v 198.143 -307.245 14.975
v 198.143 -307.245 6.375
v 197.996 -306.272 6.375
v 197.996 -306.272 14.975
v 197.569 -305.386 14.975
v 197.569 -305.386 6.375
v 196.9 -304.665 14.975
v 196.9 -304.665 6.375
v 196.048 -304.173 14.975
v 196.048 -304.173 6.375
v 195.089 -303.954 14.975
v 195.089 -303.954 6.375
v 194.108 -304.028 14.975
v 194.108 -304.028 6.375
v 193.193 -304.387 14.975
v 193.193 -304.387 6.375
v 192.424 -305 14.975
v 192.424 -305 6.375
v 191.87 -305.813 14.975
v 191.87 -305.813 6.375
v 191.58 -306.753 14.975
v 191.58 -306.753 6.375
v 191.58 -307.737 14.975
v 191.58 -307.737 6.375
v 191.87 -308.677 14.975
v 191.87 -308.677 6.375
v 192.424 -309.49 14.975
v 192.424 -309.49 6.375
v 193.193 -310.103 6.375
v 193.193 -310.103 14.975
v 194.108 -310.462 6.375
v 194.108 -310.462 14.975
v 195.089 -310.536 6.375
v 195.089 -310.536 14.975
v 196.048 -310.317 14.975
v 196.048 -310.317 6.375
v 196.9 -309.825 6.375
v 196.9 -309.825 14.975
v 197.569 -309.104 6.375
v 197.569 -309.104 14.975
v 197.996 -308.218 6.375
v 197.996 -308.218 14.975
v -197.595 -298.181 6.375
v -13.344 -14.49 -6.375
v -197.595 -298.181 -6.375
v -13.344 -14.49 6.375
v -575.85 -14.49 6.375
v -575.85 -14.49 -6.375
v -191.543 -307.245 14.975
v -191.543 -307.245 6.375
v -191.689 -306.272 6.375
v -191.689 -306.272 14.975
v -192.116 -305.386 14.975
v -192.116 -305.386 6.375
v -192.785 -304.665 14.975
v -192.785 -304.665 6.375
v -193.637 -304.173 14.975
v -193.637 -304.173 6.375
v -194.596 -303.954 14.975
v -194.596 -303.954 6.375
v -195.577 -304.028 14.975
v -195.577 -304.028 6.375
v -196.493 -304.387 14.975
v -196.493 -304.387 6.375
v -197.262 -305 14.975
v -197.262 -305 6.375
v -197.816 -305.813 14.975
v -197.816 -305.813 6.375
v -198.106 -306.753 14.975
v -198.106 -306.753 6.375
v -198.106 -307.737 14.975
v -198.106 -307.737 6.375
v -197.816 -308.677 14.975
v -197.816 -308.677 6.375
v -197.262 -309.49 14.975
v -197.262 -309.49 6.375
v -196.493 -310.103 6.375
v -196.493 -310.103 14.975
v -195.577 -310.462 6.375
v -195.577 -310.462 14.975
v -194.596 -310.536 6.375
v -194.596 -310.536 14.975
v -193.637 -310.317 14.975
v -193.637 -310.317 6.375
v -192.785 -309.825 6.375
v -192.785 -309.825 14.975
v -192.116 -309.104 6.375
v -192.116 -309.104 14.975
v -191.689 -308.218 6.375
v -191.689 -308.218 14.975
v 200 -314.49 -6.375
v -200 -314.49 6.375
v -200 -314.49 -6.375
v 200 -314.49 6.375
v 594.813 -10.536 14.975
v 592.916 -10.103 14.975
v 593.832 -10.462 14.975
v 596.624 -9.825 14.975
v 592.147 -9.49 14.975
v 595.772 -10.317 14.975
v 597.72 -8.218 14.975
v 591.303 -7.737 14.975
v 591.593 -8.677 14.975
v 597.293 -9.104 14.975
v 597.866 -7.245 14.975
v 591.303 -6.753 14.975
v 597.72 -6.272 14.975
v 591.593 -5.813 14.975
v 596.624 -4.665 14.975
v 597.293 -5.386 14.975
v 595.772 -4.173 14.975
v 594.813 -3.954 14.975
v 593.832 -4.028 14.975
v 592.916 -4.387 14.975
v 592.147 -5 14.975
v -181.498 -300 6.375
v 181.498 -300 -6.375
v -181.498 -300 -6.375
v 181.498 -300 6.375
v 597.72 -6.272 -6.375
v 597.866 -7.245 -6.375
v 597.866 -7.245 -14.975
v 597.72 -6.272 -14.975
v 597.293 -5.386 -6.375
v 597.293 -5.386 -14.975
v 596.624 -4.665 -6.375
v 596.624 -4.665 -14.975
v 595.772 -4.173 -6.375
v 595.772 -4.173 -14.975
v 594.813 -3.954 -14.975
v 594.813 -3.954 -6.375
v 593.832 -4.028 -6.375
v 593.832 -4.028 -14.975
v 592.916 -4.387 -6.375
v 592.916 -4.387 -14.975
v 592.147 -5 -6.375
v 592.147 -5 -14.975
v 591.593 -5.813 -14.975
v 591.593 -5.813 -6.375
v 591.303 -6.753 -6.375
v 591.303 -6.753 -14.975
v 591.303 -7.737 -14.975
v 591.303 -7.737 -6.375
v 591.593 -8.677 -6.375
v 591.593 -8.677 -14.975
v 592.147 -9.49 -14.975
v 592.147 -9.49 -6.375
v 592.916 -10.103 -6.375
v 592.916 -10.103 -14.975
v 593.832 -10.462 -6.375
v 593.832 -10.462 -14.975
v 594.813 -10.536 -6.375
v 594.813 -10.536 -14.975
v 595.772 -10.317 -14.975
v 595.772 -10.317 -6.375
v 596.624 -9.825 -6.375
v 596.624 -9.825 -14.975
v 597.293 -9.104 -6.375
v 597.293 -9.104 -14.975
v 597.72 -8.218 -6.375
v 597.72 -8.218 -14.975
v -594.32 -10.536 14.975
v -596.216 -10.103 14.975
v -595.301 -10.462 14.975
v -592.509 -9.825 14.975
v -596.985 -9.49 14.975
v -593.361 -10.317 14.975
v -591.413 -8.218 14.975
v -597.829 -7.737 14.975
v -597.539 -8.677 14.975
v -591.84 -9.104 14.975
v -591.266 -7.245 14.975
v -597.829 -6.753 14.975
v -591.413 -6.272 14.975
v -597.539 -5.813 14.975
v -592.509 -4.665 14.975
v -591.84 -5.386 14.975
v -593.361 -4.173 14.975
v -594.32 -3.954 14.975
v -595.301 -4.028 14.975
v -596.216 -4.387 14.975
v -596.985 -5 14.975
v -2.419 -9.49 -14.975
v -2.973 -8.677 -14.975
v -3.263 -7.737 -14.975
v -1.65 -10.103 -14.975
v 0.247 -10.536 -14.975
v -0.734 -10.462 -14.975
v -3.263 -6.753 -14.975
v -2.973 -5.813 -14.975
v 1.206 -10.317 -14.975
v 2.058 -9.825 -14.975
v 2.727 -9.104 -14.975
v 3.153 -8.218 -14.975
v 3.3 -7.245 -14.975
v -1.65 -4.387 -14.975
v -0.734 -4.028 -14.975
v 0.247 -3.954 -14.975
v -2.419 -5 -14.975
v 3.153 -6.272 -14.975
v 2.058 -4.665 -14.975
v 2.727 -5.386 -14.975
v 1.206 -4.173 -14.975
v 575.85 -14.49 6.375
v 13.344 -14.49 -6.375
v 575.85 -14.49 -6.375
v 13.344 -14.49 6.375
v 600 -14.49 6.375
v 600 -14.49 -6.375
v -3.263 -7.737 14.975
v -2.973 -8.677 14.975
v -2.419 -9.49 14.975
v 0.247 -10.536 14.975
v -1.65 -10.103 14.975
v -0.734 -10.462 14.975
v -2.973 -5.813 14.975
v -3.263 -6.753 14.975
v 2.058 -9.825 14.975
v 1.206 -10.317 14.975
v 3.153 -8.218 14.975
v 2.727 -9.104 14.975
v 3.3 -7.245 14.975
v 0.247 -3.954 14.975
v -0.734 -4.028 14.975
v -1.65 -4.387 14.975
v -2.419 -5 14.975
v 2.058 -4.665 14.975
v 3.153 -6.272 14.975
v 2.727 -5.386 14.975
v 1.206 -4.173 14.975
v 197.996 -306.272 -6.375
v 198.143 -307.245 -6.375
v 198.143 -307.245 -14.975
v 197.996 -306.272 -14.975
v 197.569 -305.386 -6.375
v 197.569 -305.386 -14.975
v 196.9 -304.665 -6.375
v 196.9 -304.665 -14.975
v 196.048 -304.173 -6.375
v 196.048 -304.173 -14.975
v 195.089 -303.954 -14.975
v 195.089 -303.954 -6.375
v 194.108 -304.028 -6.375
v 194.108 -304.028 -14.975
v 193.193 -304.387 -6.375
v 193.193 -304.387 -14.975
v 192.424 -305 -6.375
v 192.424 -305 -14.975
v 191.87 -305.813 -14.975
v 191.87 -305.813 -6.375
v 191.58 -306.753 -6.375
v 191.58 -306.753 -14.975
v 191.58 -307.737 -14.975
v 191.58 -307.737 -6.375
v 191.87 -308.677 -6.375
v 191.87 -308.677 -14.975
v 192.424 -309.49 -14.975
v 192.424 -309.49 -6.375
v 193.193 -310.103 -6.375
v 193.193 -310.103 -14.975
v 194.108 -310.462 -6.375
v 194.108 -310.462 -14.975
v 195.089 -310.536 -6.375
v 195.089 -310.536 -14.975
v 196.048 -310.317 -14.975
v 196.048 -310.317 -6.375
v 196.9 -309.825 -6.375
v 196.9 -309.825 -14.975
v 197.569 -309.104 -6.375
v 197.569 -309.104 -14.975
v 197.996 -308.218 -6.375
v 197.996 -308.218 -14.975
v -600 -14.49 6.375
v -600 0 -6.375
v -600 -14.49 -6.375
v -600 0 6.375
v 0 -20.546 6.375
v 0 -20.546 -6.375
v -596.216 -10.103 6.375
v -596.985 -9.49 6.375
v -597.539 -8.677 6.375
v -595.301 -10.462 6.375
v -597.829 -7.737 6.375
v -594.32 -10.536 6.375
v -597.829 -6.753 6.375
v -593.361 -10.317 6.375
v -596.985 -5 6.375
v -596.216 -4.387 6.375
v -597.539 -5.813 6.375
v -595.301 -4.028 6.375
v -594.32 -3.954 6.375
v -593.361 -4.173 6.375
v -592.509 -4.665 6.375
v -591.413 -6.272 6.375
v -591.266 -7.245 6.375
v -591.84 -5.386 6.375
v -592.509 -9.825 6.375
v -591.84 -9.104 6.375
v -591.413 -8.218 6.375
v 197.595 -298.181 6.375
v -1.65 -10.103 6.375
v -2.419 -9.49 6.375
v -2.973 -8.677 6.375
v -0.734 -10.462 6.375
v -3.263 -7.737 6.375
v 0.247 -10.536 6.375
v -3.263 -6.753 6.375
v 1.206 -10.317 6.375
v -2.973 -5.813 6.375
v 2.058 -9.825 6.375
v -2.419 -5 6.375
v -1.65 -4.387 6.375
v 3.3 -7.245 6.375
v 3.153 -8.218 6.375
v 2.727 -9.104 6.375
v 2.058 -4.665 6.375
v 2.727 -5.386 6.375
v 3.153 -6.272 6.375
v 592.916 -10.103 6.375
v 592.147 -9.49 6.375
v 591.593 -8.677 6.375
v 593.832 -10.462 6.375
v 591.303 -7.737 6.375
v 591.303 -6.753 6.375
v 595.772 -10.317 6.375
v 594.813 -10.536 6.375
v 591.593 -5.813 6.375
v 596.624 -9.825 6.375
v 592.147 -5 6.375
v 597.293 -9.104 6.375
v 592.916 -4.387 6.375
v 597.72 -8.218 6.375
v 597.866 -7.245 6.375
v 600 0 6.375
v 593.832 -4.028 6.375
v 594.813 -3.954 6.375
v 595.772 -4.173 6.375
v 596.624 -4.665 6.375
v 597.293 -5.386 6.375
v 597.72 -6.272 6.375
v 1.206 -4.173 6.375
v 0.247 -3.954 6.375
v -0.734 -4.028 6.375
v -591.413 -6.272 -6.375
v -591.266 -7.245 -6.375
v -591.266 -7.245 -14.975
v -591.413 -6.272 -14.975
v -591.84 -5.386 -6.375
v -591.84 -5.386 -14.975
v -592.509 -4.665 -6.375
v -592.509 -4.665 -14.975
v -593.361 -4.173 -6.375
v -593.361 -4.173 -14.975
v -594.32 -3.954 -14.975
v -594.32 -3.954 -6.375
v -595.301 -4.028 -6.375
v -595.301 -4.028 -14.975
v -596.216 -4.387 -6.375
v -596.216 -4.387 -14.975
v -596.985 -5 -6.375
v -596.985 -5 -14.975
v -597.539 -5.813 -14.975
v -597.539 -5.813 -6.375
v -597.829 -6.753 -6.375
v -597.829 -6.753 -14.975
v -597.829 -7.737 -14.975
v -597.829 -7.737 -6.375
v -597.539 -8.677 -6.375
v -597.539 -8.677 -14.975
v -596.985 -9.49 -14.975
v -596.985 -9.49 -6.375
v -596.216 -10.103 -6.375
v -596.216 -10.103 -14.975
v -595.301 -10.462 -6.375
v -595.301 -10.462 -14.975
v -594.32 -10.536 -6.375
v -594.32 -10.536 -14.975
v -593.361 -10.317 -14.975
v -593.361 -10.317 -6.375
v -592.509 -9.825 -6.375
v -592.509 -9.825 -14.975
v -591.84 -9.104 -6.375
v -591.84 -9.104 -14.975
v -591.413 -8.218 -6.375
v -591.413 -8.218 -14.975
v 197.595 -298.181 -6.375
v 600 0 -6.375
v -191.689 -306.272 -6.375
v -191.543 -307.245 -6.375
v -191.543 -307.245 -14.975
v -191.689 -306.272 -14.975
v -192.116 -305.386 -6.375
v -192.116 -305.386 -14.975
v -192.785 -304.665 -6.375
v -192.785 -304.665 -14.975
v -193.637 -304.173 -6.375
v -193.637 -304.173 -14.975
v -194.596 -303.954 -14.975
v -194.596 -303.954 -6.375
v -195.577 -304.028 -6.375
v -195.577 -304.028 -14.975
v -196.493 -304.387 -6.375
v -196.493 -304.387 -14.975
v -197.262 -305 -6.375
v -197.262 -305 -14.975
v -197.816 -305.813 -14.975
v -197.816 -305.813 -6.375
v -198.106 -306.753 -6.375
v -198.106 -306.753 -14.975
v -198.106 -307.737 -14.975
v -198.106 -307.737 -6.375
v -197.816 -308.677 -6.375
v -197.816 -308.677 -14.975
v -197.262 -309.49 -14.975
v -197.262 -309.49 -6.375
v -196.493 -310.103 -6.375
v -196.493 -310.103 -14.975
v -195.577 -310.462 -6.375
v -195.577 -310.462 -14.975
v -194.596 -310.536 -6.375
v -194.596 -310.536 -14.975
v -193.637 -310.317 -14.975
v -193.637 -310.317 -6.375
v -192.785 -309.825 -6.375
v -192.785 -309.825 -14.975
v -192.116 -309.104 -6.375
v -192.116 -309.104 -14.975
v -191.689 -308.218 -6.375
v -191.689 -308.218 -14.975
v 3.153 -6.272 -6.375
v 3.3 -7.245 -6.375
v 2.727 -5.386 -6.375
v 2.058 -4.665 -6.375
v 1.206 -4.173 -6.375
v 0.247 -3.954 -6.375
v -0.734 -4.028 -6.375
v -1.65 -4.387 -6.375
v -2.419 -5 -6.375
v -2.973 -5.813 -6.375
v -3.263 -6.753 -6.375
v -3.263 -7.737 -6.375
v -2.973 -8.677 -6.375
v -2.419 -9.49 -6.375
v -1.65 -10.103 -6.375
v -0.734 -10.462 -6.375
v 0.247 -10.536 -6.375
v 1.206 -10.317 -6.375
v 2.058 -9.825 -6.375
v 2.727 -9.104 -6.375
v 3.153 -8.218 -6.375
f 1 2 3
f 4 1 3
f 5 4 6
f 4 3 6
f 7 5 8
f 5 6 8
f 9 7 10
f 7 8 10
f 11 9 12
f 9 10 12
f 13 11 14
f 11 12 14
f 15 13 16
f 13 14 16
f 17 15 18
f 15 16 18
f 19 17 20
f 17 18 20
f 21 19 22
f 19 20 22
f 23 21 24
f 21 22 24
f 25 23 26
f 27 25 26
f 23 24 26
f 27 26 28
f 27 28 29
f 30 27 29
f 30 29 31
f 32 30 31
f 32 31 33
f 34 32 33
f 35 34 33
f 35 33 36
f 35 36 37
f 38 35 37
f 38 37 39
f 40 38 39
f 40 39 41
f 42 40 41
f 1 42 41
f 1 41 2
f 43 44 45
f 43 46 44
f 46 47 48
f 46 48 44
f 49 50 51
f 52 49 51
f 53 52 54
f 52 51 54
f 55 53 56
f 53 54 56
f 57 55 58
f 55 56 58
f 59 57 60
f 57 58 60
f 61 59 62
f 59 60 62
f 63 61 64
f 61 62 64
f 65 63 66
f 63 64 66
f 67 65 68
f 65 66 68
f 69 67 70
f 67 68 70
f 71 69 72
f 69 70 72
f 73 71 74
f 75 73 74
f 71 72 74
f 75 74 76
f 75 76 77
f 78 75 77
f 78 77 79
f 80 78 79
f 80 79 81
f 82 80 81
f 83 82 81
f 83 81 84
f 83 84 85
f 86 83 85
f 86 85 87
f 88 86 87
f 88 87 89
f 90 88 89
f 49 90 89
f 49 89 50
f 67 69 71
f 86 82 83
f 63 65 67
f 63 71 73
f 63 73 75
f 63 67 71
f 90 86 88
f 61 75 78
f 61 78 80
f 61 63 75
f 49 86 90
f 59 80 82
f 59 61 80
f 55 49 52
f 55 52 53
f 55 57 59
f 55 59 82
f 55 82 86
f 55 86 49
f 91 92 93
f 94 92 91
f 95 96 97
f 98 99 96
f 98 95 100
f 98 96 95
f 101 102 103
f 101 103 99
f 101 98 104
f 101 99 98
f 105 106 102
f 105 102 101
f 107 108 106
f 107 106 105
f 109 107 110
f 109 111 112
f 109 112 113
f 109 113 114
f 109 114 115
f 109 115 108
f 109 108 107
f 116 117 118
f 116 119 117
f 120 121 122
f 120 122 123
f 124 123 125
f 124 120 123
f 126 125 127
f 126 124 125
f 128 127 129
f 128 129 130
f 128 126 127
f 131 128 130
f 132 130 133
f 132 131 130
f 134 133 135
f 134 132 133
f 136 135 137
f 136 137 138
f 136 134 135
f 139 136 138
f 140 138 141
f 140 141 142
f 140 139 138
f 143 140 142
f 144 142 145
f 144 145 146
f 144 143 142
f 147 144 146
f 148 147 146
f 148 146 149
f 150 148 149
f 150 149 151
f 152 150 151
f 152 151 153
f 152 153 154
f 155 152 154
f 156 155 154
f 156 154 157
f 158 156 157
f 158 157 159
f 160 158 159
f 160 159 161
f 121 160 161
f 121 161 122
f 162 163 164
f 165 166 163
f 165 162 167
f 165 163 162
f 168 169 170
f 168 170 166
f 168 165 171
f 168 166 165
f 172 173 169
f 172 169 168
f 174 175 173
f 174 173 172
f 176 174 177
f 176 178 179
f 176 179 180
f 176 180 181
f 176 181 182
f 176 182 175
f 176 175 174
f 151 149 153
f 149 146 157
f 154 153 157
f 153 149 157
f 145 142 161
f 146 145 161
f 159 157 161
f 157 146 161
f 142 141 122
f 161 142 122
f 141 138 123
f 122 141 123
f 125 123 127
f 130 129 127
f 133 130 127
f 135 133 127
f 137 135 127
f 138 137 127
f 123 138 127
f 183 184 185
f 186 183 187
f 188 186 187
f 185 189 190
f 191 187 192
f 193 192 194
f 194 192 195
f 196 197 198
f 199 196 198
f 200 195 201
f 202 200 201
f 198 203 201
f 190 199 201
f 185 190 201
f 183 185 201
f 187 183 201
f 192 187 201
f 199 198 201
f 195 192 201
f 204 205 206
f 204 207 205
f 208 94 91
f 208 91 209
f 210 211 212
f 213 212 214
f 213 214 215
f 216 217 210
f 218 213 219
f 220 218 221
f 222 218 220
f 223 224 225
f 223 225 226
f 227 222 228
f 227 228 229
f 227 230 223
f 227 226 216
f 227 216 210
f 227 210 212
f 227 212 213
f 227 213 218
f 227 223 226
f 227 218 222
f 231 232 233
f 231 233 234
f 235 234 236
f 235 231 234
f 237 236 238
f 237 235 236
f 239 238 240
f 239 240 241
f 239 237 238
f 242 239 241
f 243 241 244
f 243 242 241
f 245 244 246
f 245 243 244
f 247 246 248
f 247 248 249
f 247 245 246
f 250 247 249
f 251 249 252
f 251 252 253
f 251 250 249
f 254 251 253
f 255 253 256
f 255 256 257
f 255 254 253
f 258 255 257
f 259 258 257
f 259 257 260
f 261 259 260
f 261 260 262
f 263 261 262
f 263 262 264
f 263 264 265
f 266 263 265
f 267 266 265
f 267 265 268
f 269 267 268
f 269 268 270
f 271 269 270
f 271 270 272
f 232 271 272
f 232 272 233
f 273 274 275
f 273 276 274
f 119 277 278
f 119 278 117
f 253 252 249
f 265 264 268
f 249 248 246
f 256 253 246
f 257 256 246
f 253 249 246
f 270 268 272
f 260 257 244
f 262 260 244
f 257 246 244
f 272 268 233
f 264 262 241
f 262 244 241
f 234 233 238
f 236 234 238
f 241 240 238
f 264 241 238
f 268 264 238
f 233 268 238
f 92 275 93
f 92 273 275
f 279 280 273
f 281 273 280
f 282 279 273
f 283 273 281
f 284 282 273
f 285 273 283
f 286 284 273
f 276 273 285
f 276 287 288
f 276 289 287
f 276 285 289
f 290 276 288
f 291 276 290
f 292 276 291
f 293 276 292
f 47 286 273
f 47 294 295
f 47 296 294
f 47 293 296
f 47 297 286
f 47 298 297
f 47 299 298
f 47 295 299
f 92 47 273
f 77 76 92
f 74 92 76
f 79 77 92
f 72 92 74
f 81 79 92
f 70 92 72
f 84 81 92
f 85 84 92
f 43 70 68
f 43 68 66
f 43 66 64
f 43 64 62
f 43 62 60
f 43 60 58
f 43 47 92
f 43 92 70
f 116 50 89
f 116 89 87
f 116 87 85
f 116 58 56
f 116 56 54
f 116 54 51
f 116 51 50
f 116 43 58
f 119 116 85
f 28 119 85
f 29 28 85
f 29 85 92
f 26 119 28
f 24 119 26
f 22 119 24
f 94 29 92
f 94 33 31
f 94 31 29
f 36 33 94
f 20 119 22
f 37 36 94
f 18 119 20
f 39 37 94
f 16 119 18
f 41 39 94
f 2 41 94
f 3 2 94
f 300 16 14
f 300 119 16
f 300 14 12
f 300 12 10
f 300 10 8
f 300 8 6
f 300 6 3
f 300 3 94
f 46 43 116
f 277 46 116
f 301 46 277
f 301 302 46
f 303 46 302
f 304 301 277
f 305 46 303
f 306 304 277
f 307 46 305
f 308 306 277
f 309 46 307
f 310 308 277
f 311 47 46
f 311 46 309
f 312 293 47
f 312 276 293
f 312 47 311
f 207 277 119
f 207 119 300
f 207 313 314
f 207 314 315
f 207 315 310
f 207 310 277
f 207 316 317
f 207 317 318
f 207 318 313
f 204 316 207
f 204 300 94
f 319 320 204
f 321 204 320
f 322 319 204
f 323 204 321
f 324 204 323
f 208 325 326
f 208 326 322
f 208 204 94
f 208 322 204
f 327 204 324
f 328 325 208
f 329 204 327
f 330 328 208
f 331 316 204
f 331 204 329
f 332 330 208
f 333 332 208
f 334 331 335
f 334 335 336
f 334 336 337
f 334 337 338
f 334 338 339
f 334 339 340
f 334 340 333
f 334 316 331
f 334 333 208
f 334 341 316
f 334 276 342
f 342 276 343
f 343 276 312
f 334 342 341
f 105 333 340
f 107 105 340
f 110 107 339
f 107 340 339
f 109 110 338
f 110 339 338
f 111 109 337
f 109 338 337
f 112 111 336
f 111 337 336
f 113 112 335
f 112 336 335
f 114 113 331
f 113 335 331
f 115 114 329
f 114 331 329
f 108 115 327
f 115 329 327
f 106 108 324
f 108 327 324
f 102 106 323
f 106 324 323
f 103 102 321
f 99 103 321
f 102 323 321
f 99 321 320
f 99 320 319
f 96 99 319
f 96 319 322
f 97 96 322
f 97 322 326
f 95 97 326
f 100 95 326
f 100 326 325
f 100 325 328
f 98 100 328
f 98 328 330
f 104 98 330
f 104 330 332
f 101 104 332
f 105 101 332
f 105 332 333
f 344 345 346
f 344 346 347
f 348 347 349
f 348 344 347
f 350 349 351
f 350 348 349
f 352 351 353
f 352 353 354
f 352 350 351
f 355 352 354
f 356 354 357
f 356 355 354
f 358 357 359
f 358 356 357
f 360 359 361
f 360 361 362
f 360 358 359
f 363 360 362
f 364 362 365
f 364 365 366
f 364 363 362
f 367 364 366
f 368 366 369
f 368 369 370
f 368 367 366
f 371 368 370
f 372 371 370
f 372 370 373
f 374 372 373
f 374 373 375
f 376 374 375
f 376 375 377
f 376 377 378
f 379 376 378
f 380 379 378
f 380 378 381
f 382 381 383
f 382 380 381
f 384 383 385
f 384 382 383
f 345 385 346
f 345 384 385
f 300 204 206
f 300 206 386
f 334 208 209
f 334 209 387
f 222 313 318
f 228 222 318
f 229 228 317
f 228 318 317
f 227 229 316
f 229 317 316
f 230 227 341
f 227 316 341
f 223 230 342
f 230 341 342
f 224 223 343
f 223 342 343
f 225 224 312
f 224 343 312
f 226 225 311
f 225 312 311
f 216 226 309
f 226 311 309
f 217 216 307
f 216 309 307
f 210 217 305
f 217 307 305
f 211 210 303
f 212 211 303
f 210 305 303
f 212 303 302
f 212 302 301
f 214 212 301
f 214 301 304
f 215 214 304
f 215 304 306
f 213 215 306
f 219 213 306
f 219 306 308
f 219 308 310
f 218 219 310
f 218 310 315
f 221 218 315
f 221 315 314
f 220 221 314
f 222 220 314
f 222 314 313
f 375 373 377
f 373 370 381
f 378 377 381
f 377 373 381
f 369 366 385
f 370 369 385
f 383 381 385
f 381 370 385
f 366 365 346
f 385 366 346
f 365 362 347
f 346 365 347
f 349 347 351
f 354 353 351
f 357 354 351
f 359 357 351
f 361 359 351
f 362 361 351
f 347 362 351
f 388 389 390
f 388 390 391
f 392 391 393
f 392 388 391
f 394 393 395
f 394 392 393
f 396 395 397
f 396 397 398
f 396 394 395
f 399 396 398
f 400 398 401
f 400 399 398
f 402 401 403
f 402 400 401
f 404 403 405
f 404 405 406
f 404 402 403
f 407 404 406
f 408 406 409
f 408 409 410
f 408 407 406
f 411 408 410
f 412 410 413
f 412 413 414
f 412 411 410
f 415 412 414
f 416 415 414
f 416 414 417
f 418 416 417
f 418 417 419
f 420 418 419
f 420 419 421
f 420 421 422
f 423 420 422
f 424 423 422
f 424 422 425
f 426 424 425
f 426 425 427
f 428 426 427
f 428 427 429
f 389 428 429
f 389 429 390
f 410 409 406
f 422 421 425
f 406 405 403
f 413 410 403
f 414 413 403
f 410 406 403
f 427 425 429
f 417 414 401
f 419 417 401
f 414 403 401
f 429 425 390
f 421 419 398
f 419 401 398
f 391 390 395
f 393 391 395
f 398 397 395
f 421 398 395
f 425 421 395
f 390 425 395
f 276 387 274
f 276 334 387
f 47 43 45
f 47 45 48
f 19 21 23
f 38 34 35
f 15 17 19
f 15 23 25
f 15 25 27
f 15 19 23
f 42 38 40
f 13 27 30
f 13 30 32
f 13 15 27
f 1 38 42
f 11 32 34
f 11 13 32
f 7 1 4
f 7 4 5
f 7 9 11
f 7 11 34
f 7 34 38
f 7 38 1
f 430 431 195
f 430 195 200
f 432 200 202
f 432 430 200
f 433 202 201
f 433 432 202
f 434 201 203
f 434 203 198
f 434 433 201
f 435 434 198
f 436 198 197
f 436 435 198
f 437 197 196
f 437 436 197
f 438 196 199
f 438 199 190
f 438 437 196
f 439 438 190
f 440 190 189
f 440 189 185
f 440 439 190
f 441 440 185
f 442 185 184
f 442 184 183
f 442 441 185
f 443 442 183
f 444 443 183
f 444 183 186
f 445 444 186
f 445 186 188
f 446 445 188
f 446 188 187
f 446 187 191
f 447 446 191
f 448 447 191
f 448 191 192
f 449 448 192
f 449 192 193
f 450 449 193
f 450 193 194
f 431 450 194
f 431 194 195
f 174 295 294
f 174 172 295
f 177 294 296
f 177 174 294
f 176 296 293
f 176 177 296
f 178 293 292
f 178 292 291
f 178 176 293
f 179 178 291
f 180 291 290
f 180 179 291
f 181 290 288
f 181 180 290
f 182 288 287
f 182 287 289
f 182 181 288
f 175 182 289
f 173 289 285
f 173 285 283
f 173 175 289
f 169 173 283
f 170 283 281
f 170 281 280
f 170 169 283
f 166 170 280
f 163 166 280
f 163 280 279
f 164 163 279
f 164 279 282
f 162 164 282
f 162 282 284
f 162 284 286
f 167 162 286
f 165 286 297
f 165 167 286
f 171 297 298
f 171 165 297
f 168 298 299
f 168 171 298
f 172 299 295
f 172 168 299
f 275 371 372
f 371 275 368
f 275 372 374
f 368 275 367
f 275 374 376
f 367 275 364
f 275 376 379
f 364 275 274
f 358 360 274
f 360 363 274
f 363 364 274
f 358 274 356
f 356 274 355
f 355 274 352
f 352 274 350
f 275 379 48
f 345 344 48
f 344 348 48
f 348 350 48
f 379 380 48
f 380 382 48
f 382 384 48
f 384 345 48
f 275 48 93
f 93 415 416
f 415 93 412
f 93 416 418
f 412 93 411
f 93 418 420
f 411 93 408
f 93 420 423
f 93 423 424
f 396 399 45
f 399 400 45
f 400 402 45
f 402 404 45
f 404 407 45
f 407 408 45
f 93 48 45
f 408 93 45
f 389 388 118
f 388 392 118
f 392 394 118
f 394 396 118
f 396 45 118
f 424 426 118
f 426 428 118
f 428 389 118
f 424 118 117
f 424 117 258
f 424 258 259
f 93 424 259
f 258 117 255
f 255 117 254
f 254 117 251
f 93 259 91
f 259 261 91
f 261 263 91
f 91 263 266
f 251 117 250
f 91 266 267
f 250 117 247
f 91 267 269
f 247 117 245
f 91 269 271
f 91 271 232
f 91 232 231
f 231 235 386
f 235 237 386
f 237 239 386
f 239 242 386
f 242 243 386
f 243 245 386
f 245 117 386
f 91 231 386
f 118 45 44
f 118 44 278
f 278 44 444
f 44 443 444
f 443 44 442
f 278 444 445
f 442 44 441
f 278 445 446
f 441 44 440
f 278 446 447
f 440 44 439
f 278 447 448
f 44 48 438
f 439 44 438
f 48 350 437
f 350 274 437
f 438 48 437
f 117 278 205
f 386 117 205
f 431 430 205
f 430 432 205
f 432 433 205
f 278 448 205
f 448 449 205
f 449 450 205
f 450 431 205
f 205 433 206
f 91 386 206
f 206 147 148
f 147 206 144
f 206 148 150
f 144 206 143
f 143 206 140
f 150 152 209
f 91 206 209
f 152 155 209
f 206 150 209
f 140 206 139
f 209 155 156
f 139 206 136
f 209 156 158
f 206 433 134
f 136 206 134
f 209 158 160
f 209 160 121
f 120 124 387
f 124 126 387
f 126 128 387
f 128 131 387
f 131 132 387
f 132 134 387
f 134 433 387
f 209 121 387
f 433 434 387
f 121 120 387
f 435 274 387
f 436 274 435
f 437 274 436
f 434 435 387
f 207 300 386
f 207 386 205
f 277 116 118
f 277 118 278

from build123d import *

# Parameters (mm, degrees)
BOSS_EXTRUDE2_DEPTH = 6.375
SKETCH3_R           = 3.3
BOSS_EXTRUDE3_DEPTH = 14.975


with BuildPart() as part:
    # Sketch1 → Boss-Extrude2 (new, symmetric)
    with BuildSketch(Plane.XY):
        Polygon((0, -7.245), (0, 0), (-600, 0), (-600, -14.49), (-591.306, -2.898), (-575.85, -14.49), (-13.344393946, -14.49), (-6.075978819, -3.298798486), align=None)
        Polygon((0, -20.546405114), (-3.933488865, -14.49), (-13.344393946, -14.49), (-197.595006689, -298.181244983), (-195.17, -300), (-181.498361341, -300), align=None)
        Polygon((-575.85, -14.49), (-600, -14.49), (-200, -314.49), (-200, -307.806399497), (-202.705205395, -306.049433921), (-200, -301.884220709), (-200, -300), (-198.776244152, -300), (-197.595006689, -298.181244983), align=None)
        Polygon((13.344393946, -14.49), (3.933488865, -14.49), (0, -20.546405114), (181.498361341, -300), (195.17, -300), (197.595006689, -298.181244983), align=None)
        Polygon((600, 0), (0, 0), (0, -7.245), (6.075978819, -3.298798486), (13.344393946, -14.49), (575.85, -14.49), (591.306, -2.898), (600, -14.49), align=None)
        Polygon((200, -314.49), (600, -14.49), (575.85, -14.49), (197.595006689, -298.181244983), (198.776244152, -300), (200, -300), (200, -301.884220709), (202.705205395, -306.049433921), (200, -307.806399497), align=None)
        Polygon((-200, -314.49), (200, -314.49), (196.629226576, -309.995635435), (190.553247757, -313.941836949), (181.498361341, -300), (-181.498361341, -300), (-190.553247757, -313.941836949), (-196.629226576, -309.995635435), align=None)
        Polygon((6.075978819, -3.298798486), (0, -7.245), (6.075978819, -11.191201514), (3.933488865, -14.49), (13.344393946, -14.49), align=None)
        Polygon((-6.075978819, -11.191201514), (0, -7.245), (-6.075978819, -3.298798486), (-13.344393946, -14.49), (-3.933488865, -14.49), align=None)
        Polygon((6.075978819, -11.191201514), (0, -7.245), (0, -14.49), (3.933488865, -14.49), align=None)
        Polygon((0, -14.49), (0, -7.245), (-6.075978819, -11.191201514), (-3.933488865, -14.49), align=None)
        Polygon((3.933488865, -14.49), (0, -14.49), (-3.933488865, -14.49), (0, -20.546405114), align=None)
        Polygon((198.776244152, -300), (197.595006689, -298.181244983), (195.17, -300), align=None)
        Polygon((200, -300), (198.776244152, -300), (200, -301.884220709), align=None)
        Polygon((200, -301.884220709), (200, -307.806399497), (202.705205395, -306.049433921), align=None)
        Polygon((196.629226576, -309.995635435), (200, -314.49), (200, -307.806399497), align=None)
        Polygon((196.629226576, -309.995635435), (200, -307.806399497), (200, -301.884220709), (198.776244152, -300), (195.17, -300), (191.306, -302.898), align=None)
        Polygon((190.553247757, -313.941836949), (196.629226576, -309.995635435), (191.306, -302.898), (195.17, -300), (181.498361341, -300), align=None)
        Polygon((575.85, -14.49), (600, -14.49), (591.306, -2.898), align=None)
        Polygon((-591.306, -2.898), (-600, -14.49), (-575.85, -14.49), align=None)
        Polygon((-191.306, -302.898), (-196.629226576, -309.995635435), (-190.553247757, -313.941836949), (-181.498361341, -300), (-195.17, -300), align=None)
        Polygon((-200, -307.806399497), (-200, -314.49), (-196.629226576, -309.995635435), align=None)
        Polygon((-202.705205395, -306.049433921), (-200, -307.806399497), (-200, -301.884220709), align=None)
        Polygon((-195.17, -300), (-197.595006689, -298.181244983), (-198.776244152, -300), align=None)
        Polygon((-200, -301.884220709), (-198.776244152, -300), (-200, -300), align=None)
        Polygon((-200, -301.884220709), (-200, -307.806399497), (-196.629226576, -309.995635435), (-191.306, -302.898), (-195.17, -300), (-198.776244152, -300), align=None)
    extrude(amount=BOSS_EXTRUDE2_DEPTH, both=True)

    # Sketch3 → Boss-Extrude3 (add, symmetric)
    with BuildSketch(Plane.XY):
        with Locations((0, -7.245)):
            Circle(SKETCH3_R)
        with Locations((-194.842755286, -307.245)):
            Circle(SKETCH3_R)
        with Locations((194.842755286, -307.245)):
            Circle(SKETCH3_R)
        with Locations((594.56625, -7.245)):
            Circle(SKETCH3_R)
        with Locations((-594.56625, -7.245)):
            Circle(SKETCH3_R)
    extrude(amount=BOSS_EXTRUDE3_DEPTH, both=True)


solid = part.part
